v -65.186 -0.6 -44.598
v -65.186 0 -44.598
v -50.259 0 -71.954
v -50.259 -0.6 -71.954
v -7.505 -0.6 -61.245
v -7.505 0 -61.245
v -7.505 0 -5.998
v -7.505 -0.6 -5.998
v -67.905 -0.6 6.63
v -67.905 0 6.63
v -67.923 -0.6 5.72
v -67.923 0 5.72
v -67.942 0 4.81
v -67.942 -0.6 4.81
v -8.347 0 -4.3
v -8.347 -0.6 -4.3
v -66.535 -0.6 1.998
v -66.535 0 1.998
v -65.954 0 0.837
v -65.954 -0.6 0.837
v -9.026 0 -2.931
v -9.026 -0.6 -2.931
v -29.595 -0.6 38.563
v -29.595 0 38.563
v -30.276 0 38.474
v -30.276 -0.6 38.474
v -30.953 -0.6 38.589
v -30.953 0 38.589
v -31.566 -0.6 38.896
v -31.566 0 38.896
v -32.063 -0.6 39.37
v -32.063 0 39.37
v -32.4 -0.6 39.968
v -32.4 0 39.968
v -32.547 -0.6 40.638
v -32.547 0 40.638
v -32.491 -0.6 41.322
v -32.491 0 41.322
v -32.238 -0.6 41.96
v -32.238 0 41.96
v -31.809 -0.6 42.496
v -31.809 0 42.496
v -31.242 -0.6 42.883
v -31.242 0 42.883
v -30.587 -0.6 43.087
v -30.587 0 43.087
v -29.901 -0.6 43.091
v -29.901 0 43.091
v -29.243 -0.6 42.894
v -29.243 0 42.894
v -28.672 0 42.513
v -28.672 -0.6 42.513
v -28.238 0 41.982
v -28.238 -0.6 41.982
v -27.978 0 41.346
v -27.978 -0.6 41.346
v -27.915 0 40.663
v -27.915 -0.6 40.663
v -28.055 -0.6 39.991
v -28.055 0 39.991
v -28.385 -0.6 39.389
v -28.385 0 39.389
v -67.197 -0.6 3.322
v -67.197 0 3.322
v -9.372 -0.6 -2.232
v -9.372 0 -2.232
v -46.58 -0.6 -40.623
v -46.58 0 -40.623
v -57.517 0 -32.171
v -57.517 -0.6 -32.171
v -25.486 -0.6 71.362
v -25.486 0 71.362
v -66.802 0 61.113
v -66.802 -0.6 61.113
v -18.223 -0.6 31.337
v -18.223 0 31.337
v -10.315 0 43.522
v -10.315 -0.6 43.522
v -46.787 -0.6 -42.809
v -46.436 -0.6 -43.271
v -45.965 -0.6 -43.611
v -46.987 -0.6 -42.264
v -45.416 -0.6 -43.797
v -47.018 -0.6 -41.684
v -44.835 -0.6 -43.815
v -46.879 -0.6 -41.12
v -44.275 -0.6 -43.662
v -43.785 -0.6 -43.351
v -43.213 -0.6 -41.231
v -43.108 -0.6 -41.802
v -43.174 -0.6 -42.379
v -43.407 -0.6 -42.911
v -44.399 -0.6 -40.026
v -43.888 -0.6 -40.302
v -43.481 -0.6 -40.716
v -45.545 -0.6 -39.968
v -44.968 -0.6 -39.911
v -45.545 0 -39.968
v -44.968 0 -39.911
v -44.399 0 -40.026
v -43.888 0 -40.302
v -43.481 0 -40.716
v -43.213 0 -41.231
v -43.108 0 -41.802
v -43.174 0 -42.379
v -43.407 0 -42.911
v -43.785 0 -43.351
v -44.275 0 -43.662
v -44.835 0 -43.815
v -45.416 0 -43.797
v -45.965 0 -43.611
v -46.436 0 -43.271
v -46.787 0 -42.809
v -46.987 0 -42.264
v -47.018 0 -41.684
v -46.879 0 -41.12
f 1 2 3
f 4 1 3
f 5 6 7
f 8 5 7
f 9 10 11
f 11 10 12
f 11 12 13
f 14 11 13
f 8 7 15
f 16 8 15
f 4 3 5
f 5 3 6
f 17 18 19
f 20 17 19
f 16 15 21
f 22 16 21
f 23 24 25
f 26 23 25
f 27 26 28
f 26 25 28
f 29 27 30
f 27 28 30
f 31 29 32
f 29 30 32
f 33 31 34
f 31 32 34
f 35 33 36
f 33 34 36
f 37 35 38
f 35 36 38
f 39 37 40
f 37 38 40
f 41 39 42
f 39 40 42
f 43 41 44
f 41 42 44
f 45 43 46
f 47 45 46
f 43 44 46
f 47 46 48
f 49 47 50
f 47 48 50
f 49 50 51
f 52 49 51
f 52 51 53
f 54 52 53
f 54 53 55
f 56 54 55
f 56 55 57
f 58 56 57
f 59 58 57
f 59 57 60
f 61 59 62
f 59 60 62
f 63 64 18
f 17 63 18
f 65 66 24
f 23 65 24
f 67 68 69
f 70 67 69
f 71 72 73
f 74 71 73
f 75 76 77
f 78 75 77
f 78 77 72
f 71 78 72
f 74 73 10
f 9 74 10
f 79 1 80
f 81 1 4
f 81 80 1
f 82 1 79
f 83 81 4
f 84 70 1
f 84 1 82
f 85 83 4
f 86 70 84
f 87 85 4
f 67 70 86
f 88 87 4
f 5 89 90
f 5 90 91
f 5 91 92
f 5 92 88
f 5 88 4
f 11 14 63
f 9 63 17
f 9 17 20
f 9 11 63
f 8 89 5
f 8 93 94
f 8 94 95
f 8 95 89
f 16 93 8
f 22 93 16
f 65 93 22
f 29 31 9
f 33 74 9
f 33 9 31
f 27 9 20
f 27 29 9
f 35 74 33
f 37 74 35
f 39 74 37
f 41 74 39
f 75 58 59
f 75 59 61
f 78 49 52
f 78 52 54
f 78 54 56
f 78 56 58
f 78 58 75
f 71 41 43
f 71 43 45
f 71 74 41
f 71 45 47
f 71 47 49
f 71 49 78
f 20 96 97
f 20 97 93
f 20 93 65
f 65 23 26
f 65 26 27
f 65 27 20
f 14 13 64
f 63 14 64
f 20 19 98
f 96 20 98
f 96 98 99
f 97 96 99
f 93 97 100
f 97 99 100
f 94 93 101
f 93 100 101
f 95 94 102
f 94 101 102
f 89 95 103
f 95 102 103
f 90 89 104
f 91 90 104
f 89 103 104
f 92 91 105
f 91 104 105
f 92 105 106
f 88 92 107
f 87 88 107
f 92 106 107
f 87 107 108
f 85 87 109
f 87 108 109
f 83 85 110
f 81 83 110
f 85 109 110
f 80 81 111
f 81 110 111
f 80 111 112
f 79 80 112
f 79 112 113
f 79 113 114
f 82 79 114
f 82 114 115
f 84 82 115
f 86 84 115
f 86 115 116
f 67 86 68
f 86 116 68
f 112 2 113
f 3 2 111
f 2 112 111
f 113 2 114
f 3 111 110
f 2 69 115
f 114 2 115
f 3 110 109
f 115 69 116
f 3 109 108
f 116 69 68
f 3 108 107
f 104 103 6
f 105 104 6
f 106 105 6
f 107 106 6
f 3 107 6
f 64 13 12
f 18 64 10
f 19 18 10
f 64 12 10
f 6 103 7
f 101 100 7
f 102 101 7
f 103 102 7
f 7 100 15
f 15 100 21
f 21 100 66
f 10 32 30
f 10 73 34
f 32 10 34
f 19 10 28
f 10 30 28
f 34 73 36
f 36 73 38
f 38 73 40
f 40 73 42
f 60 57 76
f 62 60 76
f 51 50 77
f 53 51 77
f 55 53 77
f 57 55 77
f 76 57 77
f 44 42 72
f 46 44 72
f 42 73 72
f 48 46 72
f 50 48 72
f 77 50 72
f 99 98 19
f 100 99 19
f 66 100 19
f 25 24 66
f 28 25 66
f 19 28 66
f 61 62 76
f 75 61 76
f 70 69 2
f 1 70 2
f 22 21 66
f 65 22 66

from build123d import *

# Parameters (mm, degrees)
F1_DEPTH = 0.6


with BuildPart() as f1:
    # F0 (on Front) → F1 (new body)
    with BuildSketch(Plane.XZ):
        with BuildLine():
            Line((-25.485562, 71.361825), (-66.801734, 61.113477))
            Line((-66.801734, 61.113477), (-67.904737, 6.629639))
            Line((-67.904737, 6.629639), (-9.025994, -2.930532))
            Line((-9.025994, -2.930532), (-9.372429, -2.231689))
            Line((-9.372429, -2.231689), (-29.59533, 38.562823))
            ThreePointArc((-29.59533, 38.562823), (-31.539924, 42.710382), (-28.384709, 39.389492))
            Line((-28.384709, 39.389492), (-18.222952, 31.336777))
            Line((-18.222952, 31.336777), (-10.314779, 43.521821))
            Line((-10.314779, 43.521821), (-25.485562, 71.361825))
        make_face()
        Polygon((-9.025994, -2.930532), (-67.904737, 6.629639), (-67.923154, 5.719927), (-8.346913, -4.300405), align=None)
        Polygon((-8.346913, -4.300405), (-67.923154, 5.719927), (-67.94157, 4.810214), (-7.505301, -5.99814), align=None)
        Polygon((-7.505301, -5.99814), (-67.94157, 4.810214), (-67.197253, 3.322065), (-7.505301, -6.950844), align=None)
        Polygon((-7.505301, -6.950844), (-67.197253, 3.322065), (-66.535123, 1.998238), (-7.505301, -8.160719), align=None)
        Polygon((-7.505301, -8.160719), (-66.535123, 1.998238), (-65.95441, 0.83719), (-7.505301, -9.583006), align=None)
        with BuildLine():
            Line((-7.505301, -9.583006), (-65.95441, 0.83719))
            Line((-65.95441, 0.83719), (-45.54529, -39.967726))
            ThreePointArc((-45.54529, -39.967726), (-44.018635, -43.524925), (-46.579982, -40.622539))
            Line((-46.579982, -40.622539), (-57.517279, -32.170705))
            Line((-57.517279, -32.170705), (-65.185875, -44.597834))
            Line((-65.185875, -44.597834), (-50.259132, -71.953654))
            Line((-50.259132, -71.953654), (-7.505301, -61.244757))
            Line((-7.505301, -61.244757), (-7.505301, -9.583006))
        make_face()
    extrude(amount=F1_DEPTH)


solid = f1.part
